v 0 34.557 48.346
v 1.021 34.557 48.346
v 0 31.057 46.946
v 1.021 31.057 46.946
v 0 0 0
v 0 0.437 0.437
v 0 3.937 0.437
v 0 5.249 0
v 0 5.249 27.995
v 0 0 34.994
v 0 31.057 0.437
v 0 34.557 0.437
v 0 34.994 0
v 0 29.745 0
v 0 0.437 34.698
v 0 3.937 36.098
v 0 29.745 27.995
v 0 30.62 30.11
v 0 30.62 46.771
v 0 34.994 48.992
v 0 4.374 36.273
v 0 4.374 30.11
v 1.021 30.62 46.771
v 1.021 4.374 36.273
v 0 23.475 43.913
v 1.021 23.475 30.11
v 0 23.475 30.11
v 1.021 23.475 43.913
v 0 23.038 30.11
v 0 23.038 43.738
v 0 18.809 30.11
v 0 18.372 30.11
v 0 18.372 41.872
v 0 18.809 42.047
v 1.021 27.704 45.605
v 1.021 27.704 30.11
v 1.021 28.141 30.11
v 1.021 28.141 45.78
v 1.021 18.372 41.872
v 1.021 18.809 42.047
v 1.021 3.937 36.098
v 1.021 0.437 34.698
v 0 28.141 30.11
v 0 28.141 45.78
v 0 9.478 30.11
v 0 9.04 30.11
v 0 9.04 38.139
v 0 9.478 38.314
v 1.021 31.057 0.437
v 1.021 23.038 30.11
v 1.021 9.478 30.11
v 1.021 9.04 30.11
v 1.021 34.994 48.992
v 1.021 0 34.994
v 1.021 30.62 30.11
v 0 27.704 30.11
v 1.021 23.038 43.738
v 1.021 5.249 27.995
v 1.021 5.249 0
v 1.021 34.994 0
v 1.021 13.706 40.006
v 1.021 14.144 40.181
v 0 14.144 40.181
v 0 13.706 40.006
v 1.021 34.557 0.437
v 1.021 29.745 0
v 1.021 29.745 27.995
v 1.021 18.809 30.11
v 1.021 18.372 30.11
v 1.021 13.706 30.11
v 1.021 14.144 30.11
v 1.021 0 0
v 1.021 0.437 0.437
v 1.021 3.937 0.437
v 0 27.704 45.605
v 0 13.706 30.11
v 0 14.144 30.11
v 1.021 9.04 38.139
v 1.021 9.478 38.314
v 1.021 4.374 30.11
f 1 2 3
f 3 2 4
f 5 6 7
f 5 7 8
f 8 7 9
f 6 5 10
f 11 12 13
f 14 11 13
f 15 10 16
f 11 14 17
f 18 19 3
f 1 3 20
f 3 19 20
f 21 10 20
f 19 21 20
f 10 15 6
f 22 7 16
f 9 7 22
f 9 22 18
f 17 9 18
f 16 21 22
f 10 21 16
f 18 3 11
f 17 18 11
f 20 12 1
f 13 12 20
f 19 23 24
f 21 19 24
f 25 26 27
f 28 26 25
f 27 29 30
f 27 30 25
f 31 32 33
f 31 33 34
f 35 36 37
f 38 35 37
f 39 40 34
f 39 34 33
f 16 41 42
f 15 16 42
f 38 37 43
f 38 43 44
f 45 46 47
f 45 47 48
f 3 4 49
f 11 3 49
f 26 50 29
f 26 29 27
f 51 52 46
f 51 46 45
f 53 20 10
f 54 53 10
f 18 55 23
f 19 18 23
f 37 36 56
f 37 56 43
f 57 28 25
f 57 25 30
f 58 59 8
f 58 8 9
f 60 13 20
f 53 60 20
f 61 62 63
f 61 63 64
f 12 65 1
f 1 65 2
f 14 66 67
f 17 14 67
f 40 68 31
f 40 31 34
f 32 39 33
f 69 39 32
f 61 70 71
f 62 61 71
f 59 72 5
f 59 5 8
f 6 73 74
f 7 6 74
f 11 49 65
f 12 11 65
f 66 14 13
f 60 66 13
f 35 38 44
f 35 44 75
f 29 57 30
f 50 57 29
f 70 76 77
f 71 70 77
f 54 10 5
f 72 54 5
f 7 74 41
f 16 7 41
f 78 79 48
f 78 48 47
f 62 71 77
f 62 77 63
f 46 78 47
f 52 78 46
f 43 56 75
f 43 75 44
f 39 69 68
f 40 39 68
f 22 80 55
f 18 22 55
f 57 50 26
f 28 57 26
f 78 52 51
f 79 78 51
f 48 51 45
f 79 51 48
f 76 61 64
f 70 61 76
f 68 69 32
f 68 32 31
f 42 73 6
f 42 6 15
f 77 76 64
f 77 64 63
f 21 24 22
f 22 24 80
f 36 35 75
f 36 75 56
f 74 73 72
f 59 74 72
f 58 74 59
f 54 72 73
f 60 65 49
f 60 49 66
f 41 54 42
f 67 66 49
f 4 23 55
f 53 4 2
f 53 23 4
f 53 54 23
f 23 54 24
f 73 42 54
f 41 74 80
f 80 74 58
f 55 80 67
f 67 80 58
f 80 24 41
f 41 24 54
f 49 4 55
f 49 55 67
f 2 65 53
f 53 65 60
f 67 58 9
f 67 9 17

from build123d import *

# Parameters (mm, degrees)
F1_DEPTH  = 88.9
F2_W      = 2133.6
F2_H      = 2438.4
F3_DEPTH  = 88.901
F4_W      = 304.8
F4_H      = 2438.4
F5_DEPTH  = 88.901
F7_DEPTH  = 88.901
F9_DEPTH  = 88.901
F11_DEPTH = 88.9
F12_W     = 304.8
F12_H     = 38.1
F13_DEPTH = 88.9
F14_SCALE = 0.0114810563


with BuildPart() as f1:
    # F0 (on Right) → F1 (new body)
    with BuildSketch(Plane.YZ):
        Polygon((0, 3048), (0, 0), (3048, 0), (3048, 4267.2), align=None)
    extrude(amount=F1_DEPTH)

    # F2 (on face) → F3 (cut, through all)
    with BuildSketch(Plane.YZ.offset(88.9)):
        with Locations((1524, 1219.2)):
            Rectangle(F2_W, F2_H)
    extrude(amount=-F3_DEPTH, mode=Mode.SUBTRACT)

    # F4 (on face) → F5 (cut, through all)
    with BuildSketch(Plane.YZ.offset(88.9)):
        with Locations((190.5, 1219.2)):
            Rectangle(F4_W, F4_H)
        with Locations((2857.5, 1219.2)):
            Rectangle(F4_W, F4_H)
    extrude(amount=-F5_DEPTH, mode=Mode.SUBTRACT)

    # F6 (on face) → F7 (cut, through all)
    with BuildSketch(Plane.YZ.offset(88.9)):
        Polygon((381, 3159.3650441696), (381, 2622.55), (2667, 2622.55), (2667, 4073.7650441696), align=None)
    extrude(amount=-F7_DEPTH, mode=Mode.SUBTRACT)

    # F8 (on face) → F9 (cut, through all)
    with BuildSketch(Plane.YZ.offset(88.9)):
        Polygon((38.1, 3022.2050441696), (38.1, 2438.4), (342.9, 2438.4), (342.9, 3144.1250441696), align=None)
        Polygon((2705.1, 2438.4), (3009.9, 2438.4), (3009.9, 4210.9250441696), (2705.1, 4089.0050441696), align=None)
    extrude(amount=-F9_DEPTH, mode=Mode.SUBTRACT)

    # F12 (on face) → F13 (join)
    with BuildSketch(Plane.YZ.offset(88.9)):
        with Locations((190.5, 19.05)):
            Rectangle(F12_W, F12_H)
        with Locations((2857.5, 19.05)):
            Rectangle(F12_W, F12_H)
    extrude(amount=-F13_DEPTH)


with BuildPart() as f11:
    # F10 (on face) → F11 (new body)
    with BuildSketch(Plane.YZ.offset(88.9)):
        Polygon((825.5, 3337.1650441696), (787.4, 3321.9250441696), (787.4, 2622.55), (825.5, 2622.55), align=None)
    extrude(amount=-F11_DEPTH)


with BuildPart() as f11b:
    # F10 (on face) → F11, piece 2 (new body)
    with BuildSketch(Plane.YZ.offset(88.9)):
        Polygon((1231.9, 3499.7250441696), (1193.8, 3484.4850441696), (1193.8, 2622.55), (1231.9, 2622.55), align=None)
    extrude(amount=-F11_DEPTH)


with BuildPart() as f11c:
    # F10 (on face) → F11, piece 3 (new body)
    with BuildSketch(Plane.YZ.offset(88.9)):
        Polygon((1638.3, 3662.2850441696), (1600.2, 3647.0450441696), (1600.2, 2622.55), (1638.3, 2622.55), align=None)
    extrude(amount=-F11_DEPTH)


with BuildPart() as f11d:
    # F10 (on face) → F11, piece 4 (new body)
    with BuildSketch(Plane.YZ.offset(88.9)):
        Polygon((2044.7, 3824.8450441696), (2006.6, 3809.6050441696), (2006.6, 2622.55), (2044.7, 2622.55), align=None)
    extrude(amount=-F11_DEPTH)


with BuildPart() as f11e:
    # F10 (on face) → F11, piece 5 (new body)
    with BuildSketch(Plane.YZ.offset(88.9)):
        Polygon((2451.1, 3987.4050441696), (2413, 3972.1650441696), (2413, 2622.55), (2451.1, 2622.55), align=None)
    extrude(amount=-F11_DEPTH)


with BuildPart() as f11e_1:
    # F14: moved
    add(f11e.part.scale(F14_SCALE))


with BuildPart() as f11c_1:
    # F14: moved
    add(f11c.part.scale(F14_SCALE))


with BuildPart() as f11_1:
    # F14: moved
    add(f11.part.scale(F14_SCALE))


with BuildPart() as f1_1:
    # F14: moved
    add(f1.part.scale(F14_SCALE))


with BuildPart() as f11b_1:
    # F14: moved
    add(f11b.part.scale(F14_SCALE))


with BuildPart() as f11d_1:
    # F14: moved
    add(f11d.part.scale(F14_SCALE))


solid = Compound([f11e_1.part, f11c_1.part, f11_1.part, f1_1.part, f11b_1.part, f11d_1.part])
